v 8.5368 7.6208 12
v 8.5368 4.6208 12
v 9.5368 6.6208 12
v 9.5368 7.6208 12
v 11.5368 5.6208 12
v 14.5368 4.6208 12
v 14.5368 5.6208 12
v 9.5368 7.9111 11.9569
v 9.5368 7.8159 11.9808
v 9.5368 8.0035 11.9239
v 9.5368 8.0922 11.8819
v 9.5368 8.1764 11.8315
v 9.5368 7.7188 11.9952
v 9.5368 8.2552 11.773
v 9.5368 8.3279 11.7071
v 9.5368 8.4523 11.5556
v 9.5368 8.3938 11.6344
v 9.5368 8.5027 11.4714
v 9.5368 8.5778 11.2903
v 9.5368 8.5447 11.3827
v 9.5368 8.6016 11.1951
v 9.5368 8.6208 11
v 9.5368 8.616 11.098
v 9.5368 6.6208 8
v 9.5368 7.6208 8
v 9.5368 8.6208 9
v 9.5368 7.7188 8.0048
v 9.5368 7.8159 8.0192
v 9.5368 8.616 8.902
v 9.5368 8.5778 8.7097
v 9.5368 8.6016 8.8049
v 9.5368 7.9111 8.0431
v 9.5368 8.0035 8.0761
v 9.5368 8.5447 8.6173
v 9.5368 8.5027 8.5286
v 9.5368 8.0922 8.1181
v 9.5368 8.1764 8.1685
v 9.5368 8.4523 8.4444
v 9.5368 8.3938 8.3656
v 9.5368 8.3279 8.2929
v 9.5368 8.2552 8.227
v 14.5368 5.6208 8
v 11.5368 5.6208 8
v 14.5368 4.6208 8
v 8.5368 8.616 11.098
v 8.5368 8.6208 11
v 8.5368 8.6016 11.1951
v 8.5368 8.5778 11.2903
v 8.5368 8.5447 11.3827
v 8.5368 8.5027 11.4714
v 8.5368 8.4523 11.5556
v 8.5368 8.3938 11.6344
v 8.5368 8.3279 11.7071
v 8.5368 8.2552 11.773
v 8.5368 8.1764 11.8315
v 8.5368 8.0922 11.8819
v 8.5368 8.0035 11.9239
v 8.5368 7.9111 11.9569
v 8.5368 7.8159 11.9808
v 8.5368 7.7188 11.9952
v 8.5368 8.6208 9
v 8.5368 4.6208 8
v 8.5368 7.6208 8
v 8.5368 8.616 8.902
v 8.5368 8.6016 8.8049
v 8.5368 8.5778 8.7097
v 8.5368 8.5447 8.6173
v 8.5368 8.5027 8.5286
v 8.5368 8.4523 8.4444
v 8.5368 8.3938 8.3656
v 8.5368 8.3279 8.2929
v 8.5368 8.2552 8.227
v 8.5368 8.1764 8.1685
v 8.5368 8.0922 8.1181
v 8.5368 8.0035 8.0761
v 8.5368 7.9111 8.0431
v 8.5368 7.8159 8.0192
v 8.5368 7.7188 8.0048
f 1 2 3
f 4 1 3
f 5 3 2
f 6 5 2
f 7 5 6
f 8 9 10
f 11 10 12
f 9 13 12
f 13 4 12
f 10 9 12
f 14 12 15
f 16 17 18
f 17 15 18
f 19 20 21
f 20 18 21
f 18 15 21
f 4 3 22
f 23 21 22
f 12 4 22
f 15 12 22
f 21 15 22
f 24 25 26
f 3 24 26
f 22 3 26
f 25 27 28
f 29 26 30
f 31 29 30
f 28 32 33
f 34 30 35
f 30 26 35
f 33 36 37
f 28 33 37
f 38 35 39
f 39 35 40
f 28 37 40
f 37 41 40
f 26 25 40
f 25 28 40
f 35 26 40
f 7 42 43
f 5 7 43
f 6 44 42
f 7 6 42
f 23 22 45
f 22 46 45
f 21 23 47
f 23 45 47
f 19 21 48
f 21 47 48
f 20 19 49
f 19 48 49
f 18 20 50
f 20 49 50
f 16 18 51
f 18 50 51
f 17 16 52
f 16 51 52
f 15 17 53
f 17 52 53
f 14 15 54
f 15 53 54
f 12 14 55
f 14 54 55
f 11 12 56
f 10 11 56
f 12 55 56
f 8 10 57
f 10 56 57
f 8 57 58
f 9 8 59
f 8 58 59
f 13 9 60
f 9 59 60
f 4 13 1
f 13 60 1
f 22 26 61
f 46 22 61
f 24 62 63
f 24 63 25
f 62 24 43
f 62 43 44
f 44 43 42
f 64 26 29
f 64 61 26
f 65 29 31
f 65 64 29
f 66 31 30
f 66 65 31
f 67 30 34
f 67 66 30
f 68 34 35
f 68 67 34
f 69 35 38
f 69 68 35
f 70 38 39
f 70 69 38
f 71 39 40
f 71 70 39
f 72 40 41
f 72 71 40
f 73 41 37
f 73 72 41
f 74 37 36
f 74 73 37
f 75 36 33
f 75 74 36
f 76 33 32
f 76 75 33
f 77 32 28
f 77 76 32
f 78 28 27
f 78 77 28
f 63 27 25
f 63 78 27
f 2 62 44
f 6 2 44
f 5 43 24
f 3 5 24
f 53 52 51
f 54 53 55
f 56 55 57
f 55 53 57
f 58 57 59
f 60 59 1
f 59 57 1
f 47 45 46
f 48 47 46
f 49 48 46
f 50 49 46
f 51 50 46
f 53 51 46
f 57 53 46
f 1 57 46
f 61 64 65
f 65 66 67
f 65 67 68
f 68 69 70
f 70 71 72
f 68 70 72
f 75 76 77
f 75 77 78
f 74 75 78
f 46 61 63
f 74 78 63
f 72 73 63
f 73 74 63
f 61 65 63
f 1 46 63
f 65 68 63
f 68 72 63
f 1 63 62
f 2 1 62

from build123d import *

# Parameters (mm, degrees)
EXTRUDE_1_DEPTH = 20
FILLET_1_R      = 5
SCALE_1_SCALE   = 0.2


with BuildPart() as part:
    # 草圖1 → 填料-伸長1 (new body)
    with BuildSketch(Plane.XY):
        Polygon((30, 5), (15, 5), (5, 10), (5, 20), (0, 20), (0, 5), (0, 0), (5, 0), (30, 0), align=None)
    extrude(amount=EXTRUDE_1_DEPTH)

    # 圓角1
    fillet_1_edges = [part.edges().sort_by_distance(p)[0] for p in [
        (2.5, 20, 20),
        (2.5, 20, 0),
    ]]
    fillet(fillet_1_edges, radius=FILLET_1_R)


with BuildPart() as part_1:
    # 縮放比例1: scaled about (10.67100901, 5.776025911, 10)
    add(part.part.scale(SCALE_1_SCALE).moved(Location((8.536807208, 4.620820729, 8))))


solid = part_1.part
